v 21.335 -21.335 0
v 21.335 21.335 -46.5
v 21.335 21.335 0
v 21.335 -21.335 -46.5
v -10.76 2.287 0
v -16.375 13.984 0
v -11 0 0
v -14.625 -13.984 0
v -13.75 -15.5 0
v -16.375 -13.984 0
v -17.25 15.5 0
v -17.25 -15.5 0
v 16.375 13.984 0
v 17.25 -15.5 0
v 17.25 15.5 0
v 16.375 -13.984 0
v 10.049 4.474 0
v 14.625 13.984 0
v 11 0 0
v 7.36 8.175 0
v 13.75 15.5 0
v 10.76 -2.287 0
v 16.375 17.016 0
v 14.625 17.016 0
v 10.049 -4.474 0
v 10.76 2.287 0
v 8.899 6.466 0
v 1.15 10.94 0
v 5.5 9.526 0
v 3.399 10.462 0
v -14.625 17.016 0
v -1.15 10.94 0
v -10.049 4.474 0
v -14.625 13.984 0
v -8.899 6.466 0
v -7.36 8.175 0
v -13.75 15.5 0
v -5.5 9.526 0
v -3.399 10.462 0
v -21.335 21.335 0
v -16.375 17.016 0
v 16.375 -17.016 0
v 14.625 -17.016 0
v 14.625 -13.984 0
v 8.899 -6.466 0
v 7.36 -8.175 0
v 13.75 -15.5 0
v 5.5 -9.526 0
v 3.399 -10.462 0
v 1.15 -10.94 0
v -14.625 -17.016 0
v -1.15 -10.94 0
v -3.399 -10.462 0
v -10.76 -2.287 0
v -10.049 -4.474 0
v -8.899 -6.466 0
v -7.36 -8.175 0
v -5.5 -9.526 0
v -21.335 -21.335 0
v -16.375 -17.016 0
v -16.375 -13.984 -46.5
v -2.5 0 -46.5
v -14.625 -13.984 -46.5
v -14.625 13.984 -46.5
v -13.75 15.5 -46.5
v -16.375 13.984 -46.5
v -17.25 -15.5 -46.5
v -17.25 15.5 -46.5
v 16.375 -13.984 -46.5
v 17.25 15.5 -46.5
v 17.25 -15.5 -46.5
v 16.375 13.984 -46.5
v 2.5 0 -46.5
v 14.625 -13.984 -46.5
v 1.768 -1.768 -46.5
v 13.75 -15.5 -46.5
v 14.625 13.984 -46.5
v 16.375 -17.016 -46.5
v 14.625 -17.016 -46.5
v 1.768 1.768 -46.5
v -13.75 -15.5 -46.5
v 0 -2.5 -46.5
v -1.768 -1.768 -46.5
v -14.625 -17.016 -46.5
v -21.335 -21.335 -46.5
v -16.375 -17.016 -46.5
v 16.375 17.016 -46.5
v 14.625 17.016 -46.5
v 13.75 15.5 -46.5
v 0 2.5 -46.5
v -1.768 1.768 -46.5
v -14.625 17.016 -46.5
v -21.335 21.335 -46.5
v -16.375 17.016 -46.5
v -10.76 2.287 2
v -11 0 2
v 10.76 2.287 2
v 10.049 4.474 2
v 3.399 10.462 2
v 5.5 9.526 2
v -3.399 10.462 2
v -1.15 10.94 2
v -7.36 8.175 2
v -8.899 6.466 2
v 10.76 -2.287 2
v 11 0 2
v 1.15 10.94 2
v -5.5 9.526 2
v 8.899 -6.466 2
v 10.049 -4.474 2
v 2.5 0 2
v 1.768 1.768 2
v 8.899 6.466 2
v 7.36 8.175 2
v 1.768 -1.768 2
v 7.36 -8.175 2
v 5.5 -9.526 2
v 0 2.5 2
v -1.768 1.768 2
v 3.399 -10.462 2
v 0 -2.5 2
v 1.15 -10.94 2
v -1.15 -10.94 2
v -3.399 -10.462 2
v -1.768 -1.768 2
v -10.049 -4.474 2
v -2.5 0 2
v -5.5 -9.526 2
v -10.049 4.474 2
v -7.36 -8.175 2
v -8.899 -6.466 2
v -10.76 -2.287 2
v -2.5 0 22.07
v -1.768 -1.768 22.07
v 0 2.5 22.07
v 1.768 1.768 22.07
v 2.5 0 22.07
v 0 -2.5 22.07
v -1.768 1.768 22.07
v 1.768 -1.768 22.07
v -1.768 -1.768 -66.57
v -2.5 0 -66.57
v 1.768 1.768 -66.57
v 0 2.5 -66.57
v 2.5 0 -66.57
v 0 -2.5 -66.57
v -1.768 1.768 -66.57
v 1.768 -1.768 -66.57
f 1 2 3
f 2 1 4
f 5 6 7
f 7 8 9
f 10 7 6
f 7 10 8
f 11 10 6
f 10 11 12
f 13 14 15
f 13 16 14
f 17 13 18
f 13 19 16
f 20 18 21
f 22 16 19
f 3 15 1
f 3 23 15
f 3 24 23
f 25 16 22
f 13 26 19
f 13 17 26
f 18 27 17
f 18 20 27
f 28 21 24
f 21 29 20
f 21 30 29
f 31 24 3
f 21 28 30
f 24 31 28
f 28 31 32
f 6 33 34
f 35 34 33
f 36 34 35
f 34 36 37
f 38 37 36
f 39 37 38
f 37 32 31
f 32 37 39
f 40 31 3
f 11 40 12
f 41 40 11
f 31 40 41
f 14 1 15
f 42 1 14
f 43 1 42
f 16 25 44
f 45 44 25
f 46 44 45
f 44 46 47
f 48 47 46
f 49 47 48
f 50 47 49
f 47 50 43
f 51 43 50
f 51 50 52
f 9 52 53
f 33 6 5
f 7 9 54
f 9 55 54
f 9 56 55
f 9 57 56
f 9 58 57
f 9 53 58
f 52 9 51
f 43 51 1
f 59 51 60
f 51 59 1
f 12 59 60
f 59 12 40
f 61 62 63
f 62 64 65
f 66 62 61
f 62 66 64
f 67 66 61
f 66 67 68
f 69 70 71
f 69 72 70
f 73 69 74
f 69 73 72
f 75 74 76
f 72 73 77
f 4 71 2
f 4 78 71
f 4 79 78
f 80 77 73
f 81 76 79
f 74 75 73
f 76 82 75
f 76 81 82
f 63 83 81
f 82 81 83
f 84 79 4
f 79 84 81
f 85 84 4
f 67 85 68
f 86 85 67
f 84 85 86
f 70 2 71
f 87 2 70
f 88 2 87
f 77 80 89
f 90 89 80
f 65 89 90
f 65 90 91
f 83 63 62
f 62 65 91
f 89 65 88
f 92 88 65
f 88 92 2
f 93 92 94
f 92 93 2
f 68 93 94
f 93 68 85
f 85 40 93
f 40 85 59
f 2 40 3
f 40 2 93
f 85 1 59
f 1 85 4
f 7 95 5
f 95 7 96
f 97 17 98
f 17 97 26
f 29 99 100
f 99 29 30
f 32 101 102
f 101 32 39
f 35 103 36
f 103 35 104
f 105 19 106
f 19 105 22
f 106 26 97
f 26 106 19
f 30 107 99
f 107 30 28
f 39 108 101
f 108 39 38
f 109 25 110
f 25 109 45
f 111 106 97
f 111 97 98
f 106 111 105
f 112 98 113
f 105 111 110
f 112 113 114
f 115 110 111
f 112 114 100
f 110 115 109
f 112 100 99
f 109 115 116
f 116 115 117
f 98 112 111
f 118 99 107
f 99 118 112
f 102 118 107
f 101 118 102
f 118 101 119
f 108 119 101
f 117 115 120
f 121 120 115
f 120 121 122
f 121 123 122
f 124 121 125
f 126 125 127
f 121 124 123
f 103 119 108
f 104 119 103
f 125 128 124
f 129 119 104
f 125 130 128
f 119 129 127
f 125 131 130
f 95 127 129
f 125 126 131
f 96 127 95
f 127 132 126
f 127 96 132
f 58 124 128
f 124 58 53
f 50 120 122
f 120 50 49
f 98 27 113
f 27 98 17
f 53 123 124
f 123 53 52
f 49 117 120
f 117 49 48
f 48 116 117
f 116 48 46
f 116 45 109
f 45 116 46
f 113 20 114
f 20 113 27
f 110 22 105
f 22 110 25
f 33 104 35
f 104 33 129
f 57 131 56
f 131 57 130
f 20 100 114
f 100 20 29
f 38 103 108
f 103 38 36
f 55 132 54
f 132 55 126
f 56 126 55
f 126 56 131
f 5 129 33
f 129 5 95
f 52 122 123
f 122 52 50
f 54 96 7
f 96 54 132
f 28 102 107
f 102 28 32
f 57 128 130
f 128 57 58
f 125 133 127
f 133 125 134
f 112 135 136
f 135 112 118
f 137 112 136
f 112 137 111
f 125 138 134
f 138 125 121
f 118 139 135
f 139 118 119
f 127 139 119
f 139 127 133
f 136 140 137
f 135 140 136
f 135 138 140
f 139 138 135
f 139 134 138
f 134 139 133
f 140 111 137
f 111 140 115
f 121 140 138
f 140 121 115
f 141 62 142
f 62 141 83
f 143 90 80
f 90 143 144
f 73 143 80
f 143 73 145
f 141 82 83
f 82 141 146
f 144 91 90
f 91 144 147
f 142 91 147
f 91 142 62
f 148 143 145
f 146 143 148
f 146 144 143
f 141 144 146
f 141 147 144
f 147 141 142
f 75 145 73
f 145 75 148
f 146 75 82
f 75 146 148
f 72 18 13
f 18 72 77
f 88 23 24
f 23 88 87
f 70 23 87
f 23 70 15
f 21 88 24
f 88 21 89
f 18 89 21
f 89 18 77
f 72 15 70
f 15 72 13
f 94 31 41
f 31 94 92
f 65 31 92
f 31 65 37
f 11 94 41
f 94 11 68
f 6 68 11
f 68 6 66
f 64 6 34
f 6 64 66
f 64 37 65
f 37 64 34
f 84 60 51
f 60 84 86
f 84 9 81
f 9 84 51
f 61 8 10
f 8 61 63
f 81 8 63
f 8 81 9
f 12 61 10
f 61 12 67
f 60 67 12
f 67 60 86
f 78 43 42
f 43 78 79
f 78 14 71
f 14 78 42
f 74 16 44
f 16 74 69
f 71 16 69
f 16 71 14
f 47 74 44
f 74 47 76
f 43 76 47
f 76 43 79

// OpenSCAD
// Model: NEMA23
// Model: NEMA17
// Author: Bogdan Kecman
// Licence: GPL
//
// Usage:
// nema17(1); //nema17 double shaft
// nema17(); //nema17 siingle shaft
// nema23(1, 1); //nema23 double shaft cylinder
// nema23(1); //nema23 double shaft cube
// nema23(); //nema23 single shaft cube
// nema23(0,1); //nema23 single shaft cylinder



module nema23(has_back, is_cylinder){
  mplate = 56.9; //mounting plate width
  mplateH = 5.3; //mounting plate height

  ringR = 38.10 / 2; //ring radius
  ringH = 1.3; //ring thickness

  shaftR = 6.337/2; //shaft radius
  shaftH = 20.6;  //shaft lenght

  bodyL = 46.5; //46.5, 56.1, 77.7, 103.1, ...
  bodyInnerCube = 37.6;

  holeR = 5.21/2;
  holeL = 47.14/2; //distance between hole centres

  difference(){
    union(){
      //mounting plate
      color([0.7,0.7,0.7]) cube(size = [mplate,mplate,mplateH], center = true);
      //ring
      color([0.7,0.7,0.7]) translate(v=[0,0,mplateH/2+ringH/2]) cylinder(r=ringR, h=ringH, center=true);
      //shaft front
      color([0.9,0.9,0.9]) translate(v=[0,0,mplateH/2+ringH+shaftH/2])cylinder(r=shaftR, h=shaftH, center=true);
      if (has_back == 1){
        color([0.9,0.9,0.9])  translate(v=[0,0,0-bodyL-shaftH/2]) cylinder(r=shaftR, h=shaftH, center=true);
      }
      //body
      if (is_cylinder == 1){
        color([0.1,0.1,0.1]) translate(v=[0,0,0-mplateH/2-bodyL/2]) cylinder(r=mplate/2, h=bodyL, center=true);
      }else{
        union(){
          color([0.1,0.1,0.1]) translate(v=[0,0,0-mplateH/2-bodyL/2]) cube(size = [bodyInnerCube, mplate, bodyL], center=true);
          color([0.1,0.1,0.1]) translate(v=[0,0,0-mplateH/2-bodyL/2]) cube(size = [mplate,bodyInnerCube, bodyL], center=true);
        }
      }
    }
    translate(v=[holeL,holeL,0]) cylinder(r = holeR, h = 2*mplateH, center=true);
    translate(v=[-holeL,holeL,0]) cylinder(r = holeR, h = 2*mplateH, center=true);
    translate(v=[-holeL,-holeL,0]) cylinder(r = holeR, h = 2*mplateH, center=true);
    translate(v=[holeL,-holeL,0]) cylinder(r = holeR, h = 2*mplateH, center=true);
  }
  
}
nema17(1, 0);
module nema17(has_back, is_cylinder){
  mplate = 42.67; //mounting plate width
  mplateH = 0; //mounting plate height

  ringR = 22 / 2; //ring radius, can be 21.95/2
  ringH = 2; //ring thickness

  shaftR = 5/2; //shaft radius, can be 4.988/2
  shaftH = 20.07;  //shaft lenght

  bodyL = 46.5; //25.3, 33.13, 34.7, 40.9, 47.0, ...

  holeR = 3.5/2; //M3 or M4 or #4-40
  holeL = 31.0/2; //distance between hole centres

  difference(){
    union(){
      //ring
      color([0.7,0.7,0.7]) translate(v=[0,0,ringH/2]) cylinder(r=ringR, h=ringH, center=true);
      //shaft front
      color([0.9,0.9,0.9]) translate(v=[0,0,ringH+shaftH/2])cylinder(r=shaftR, h=shaftH, center=true);
      if (has_back == 1){
        color([0.9,0.9,0.9]) translate(v=[0,0,0-bodyL-shaftH/2]) cylinder(r=shaftR, h=shaftH, center=true);
      }
      //body
      if (is_cylinder == 1){
        color([0.1,0.1,0.1]) translate(v=[0,0,0-bodyL/2]) cylinder(r=mplate/2*1.2, h=bodyL, center=true);
      }else{
        union(){
          color([0.1,0.1,0.1]) translate(v=[0,0,0-bodyL/2]) cube(size = [mplate, mplate, bodyL], center=true);
          color([0.1,0.1,0.1]) translate(v=[0,0,0-bodyL/2]) cube(size = [mplate, mplate, bodyL], center=true);
        }
      }
    }
    translate(v=[holeL,holeL,0-bodyL/2]) cylinder(r = holeR, h = bodyL+10, center=true);
    translate(v=[-holeL,holeL,0-bodyL/2]) cylinder(r = holeR, h = bodyL+10, center=true);
    translate(v=[-holeL,-holeL,0-bodyL/2]) cylinder(r = holeR, h = bodyL+10, center=true);
    translate(v=[holeL,-holeL,0-bodyL/2]) cylinder(r = holeR, h = bodyL+10, center=true);
  }
  
}
